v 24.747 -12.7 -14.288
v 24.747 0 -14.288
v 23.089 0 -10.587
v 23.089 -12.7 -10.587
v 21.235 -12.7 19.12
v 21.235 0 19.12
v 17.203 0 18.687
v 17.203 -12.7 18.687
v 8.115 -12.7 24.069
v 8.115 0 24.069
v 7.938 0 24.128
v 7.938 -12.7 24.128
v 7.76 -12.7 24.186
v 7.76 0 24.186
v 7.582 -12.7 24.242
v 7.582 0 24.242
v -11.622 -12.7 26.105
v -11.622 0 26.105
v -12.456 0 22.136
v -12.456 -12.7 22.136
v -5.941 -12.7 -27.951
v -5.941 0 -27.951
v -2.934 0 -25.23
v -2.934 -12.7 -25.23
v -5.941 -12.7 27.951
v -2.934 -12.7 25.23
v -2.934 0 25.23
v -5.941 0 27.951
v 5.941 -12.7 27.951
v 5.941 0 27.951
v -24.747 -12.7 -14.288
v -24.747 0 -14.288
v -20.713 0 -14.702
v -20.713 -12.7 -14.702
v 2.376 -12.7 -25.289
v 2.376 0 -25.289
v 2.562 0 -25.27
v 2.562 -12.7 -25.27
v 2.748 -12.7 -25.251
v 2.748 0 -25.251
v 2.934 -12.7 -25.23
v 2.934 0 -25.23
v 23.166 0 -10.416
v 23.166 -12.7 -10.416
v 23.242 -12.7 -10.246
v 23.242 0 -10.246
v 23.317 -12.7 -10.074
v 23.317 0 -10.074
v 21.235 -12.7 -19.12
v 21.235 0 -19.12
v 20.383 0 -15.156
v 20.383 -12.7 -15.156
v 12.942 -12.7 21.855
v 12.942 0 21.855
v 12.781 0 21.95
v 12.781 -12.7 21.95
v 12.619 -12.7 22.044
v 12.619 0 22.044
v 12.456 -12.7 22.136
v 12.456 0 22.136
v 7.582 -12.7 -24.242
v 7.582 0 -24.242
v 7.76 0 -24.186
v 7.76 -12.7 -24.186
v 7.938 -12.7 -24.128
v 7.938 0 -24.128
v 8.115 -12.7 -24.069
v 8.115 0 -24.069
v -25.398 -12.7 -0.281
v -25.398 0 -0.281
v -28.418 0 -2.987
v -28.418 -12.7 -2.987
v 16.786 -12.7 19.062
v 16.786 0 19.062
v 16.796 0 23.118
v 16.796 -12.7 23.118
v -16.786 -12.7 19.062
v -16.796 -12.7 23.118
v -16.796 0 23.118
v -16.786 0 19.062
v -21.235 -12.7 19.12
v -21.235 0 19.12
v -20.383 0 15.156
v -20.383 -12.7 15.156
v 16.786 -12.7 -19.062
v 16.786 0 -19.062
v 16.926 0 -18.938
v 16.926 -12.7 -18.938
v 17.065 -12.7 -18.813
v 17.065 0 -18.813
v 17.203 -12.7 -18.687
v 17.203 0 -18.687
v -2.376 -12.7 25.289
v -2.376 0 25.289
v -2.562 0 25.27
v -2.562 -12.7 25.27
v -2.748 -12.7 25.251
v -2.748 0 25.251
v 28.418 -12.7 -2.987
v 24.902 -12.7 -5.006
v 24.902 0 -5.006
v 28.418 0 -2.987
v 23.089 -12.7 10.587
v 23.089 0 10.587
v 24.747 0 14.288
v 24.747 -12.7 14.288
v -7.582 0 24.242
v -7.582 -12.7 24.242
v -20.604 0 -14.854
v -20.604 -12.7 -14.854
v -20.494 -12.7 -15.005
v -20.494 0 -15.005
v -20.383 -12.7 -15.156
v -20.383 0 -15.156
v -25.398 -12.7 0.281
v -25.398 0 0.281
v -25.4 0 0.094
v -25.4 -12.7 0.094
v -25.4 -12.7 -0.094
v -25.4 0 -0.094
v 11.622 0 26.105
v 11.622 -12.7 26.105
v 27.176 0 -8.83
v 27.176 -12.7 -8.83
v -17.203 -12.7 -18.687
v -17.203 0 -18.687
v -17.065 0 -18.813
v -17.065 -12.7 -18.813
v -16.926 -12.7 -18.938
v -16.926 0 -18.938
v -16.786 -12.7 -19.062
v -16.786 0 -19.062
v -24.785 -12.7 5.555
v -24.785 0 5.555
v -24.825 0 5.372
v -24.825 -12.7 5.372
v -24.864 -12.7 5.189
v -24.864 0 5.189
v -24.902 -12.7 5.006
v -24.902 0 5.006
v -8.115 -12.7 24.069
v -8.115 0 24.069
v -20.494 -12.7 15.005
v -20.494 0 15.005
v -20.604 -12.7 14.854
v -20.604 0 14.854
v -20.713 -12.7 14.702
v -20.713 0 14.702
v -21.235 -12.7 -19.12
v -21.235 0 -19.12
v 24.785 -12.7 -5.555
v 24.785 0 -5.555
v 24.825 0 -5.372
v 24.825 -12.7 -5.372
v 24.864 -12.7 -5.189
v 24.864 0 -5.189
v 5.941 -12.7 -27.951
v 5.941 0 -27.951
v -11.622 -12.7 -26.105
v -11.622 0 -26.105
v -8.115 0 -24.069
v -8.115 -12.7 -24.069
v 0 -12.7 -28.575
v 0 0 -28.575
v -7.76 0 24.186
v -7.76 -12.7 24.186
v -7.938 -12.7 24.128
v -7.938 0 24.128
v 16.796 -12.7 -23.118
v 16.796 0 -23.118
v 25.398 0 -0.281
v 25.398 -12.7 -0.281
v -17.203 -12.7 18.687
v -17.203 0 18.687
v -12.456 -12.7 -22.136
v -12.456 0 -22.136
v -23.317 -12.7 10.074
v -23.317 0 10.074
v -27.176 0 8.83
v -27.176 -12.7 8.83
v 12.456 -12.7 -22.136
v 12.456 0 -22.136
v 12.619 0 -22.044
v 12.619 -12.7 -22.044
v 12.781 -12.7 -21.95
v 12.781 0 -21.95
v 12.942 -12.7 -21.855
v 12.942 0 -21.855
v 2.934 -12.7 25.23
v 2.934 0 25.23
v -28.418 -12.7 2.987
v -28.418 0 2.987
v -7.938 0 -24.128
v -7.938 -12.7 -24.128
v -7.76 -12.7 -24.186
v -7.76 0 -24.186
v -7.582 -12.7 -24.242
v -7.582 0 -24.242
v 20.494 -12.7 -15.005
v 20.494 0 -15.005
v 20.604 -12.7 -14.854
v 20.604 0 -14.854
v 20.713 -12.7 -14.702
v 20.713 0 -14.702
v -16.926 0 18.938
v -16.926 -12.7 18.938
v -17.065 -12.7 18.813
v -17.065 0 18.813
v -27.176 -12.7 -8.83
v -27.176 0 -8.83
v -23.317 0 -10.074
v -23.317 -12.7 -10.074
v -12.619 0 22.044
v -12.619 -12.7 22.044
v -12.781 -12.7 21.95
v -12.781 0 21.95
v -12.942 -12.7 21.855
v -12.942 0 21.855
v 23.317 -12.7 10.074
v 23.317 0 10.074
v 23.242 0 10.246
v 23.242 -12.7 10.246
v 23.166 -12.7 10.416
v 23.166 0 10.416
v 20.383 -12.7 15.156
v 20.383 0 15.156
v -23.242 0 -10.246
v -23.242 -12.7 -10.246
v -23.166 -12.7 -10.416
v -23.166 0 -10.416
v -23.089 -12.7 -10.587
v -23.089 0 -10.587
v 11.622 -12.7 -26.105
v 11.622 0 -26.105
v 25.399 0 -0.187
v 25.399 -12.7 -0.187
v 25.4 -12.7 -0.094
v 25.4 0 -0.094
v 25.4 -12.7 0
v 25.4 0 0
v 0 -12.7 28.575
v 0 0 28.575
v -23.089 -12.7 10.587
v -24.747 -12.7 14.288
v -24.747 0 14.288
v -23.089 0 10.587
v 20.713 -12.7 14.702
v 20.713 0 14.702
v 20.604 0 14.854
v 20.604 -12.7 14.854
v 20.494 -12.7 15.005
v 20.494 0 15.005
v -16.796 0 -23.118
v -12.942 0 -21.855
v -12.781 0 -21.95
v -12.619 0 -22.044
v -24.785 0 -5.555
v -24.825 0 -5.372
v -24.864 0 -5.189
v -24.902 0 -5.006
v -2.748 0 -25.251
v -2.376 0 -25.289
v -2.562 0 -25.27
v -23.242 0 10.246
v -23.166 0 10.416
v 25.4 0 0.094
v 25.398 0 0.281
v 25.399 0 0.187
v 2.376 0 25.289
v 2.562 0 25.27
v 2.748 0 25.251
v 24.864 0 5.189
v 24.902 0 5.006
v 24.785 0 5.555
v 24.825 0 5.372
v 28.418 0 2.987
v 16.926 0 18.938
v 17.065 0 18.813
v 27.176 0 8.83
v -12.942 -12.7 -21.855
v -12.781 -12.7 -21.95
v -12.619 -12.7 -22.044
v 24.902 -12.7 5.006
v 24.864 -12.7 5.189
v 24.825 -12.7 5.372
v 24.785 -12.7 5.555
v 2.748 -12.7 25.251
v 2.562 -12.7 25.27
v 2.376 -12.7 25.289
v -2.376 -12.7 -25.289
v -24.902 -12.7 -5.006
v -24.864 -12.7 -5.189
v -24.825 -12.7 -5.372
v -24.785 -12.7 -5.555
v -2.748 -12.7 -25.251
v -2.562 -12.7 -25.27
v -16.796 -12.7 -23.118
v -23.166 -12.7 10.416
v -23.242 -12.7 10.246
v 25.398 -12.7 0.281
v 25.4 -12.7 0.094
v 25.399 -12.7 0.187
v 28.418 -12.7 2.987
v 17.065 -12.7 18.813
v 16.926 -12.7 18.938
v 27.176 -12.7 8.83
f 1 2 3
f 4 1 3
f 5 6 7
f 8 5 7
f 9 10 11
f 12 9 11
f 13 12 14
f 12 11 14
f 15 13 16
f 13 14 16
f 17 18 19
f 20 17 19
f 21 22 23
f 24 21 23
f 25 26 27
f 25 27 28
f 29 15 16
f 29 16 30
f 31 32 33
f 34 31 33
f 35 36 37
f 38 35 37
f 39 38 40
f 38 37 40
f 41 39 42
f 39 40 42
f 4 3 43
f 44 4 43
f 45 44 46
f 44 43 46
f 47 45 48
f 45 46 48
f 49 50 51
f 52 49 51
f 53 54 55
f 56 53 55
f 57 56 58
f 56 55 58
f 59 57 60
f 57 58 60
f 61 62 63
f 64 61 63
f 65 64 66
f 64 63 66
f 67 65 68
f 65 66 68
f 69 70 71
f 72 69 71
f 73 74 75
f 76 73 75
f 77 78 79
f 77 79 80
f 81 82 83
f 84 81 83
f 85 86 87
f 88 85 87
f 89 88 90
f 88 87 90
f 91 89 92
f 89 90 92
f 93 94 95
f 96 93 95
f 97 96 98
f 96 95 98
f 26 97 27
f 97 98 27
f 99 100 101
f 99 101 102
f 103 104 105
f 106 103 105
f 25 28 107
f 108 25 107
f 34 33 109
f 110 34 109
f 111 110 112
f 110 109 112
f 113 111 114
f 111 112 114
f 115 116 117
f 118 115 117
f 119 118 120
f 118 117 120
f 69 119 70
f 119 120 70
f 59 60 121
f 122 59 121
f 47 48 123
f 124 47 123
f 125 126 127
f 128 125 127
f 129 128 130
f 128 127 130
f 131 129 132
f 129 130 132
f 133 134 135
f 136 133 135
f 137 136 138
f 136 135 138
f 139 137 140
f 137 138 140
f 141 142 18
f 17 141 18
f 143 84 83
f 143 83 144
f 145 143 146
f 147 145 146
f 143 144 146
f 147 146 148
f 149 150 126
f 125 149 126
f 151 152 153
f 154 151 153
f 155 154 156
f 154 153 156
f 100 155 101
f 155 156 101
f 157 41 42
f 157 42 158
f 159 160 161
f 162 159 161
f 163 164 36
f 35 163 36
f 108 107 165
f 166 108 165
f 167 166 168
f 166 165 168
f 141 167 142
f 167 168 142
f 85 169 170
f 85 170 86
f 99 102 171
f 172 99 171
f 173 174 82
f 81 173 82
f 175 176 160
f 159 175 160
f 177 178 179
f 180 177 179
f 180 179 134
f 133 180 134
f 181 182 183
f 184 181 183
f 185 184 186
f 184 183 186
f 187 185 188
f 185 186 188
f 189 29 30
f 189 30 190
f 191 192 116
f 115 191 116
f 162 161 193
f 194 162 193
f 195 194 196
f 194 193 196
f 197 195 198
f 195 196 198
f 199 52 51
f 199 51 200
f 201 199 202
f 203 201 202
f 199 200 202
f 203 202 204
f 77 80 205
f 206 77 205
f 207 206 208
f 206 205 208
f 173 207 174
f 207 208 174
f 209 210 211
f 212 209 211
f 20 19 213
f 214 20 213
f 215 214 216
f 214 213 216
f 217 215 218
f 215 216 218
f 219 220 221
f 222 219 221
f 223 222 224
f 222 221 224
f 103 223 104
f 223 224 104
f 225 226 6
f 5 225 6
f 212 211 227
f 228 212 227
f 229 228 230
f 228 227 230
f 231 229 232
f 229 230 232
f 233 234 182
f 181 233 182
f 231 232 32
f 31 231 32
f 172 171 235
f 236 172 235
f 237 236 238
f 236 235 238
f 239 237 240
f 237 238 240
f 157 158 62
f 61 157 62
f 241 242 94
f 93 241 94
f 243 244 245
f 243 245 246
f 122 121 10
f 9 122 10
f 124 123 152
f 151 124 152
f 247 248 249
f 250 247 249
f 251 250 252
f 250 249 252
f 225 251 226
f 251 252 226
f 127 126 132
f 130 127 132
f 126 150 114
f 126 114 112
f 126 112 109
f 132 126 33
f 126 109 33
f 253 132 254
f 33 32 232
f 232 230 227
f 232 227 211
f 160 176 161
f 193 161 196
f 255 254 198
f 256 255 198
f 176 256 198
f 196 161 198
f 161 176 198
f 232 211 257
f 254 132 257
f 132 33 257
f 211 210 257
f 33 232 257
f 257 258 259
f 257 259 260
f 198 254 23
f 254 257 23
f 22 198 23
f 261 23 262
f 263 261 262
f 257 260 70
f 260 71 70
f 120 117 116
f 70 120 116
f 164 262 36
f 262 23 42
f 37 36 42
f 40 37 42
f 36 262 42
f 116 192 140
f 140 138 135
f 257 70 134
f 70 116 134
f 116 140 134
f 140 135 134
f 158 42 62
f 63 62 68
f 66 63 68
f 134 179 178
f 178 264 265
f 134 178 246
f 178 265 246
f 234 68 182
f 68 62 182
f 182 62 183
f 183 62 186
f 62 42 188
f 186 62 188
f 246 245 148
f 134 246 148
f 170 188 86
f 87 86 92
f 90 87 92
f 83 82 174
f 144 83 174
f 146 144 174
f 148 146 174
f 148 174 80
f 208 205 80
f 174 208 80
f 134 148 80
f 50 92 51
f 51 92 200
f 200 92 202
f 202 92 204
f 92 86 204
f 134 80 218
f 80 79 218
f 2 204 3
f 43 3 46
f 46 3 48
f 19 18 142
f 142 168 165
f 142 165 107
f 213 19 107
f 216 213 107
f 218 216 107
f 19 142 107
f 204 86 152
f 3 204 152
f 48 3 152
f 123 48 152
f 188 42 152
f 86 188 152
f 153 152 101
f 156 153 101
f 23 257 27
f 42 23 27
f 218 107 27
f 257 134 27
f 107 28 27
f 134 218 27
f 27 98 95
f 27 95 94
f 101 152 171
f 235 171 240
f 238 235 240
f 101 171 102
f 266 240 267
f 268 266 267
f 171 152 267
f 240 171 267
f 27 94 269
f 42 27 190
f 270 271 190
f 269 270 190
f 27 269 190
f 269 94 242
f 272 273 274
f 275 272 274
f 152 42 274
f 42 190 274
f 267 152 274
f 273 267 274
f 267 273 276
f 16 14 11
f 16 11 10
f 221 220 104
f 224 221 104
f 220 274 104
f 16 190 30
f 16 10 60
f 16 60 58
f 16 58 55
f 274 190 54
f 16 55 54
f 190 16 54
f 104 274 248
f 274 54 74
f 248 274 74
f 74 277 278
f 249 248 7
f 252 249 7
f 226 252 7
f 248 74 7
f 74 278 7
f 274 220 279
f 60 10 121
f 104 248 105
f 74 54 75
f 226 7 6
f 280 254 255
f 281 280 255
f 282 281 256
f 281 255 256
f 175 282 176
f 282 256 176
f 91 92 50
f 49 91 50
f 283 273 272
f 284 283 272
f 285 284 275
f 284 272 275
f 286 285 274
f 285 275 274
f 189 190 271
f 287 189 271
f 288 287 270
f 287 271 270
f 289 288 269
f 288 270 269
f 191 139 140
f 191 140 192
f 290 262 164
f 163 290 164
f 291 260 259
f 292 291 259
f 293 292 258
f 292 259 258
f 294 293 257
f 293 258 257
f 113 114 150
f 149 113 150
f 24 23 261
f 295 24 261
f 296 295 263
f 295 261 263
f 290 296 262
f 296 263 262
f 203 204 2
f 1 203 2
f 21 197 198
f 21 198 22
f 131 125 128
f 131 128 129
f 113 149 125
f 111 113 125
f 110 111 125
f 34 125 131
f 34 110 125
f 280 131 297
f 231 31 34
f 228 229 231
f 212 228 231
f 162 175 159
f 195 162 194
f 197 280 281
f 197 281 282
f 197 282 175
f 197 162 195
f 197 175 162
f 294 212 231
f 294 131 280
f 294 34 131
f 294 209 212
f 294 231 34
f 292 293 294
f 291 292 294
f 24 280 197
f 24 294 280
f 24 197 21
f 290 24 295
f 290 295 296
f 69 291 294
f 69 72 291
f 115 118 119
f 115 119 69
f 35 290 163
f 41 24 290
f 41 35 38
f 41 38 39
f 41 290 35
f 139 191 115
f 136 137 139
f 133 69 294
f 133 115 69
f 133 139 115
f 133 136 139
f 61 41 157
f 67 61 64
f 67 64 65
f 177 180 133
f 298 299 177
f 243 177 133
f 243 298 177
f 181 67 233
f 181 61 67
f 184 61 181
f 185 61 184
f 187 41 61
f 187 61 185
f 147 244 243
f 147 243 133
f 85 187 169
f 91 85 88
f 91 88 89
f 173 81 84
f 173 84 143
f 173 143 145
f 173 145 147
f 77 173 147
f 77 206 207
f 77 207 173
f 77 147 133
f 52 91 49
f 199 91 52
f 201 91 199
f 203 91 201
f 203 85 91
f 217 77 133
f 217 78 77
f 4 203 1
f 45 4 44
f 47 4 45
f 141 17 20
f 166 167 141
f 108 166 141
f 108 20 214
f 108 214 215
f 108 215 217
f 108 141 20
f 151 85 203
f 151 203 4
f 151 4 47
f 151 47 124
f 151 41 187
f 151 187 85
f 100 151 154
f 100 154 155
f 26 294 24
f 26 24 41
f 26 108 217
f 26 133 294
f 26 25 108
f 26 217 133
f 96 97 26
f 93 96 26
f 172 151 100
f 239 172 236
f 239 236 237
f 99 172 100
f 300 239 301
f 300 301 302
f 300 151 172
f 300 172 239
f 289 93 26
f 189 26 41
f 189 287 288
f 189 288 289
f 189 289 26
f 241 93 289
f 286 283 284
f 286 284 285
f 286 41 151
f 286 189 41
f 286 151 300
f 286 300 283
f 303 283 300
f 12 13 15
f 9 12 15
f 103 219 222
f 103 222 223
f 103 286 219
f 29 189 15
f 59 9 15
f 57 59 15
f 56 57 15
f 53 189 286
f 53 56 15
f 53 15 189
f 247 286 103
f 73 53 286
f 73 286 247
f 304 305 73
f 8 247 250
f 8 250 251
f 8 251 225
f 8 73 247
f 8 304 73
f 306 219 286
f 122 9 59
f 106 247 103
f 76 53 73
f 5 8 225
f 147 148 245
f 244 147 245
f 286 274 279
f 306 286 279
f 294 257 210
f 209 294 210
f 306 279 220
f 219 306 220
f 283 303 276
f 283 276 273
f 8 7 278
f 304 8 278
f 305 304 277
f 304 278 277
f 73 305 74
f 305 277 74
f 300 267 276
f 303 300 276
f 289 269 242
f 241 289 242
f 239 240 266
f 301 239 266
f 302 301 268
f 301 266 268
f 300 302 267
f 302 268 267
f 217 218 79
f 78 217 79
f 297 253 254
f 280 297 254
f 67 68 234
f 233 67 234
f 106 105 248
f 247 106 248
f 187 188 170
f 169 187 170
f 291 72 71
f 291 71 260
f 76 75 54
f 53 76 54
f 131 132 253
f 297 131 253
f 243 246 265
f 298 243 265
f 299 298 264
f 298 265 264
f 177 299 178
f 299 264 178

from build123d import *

# Parameters (mm, degrees)
F1_DEPTH = 12.7


with BuildPart() as f1:
    # F0 (on Front) → F1 (new body)
    with BuildSketch(Plane.XZ):
        with BuildLine():
            ThreePointArc((25.39845, -0.280579), (25.399613, -0.140292), (25.4, 0))
            ThreePointArc((25.4, 0), (25.399613, 0.140292), (25.39845, 0.280579))
            ThreePointArc((25.39845, 0.280579), (25.260856, 2.655023), (24.901769, 5.006187))
            ThreePointArc((24.901769, 5.006187), (24.844949, 5.280957), (24.785097, 5.555083))
            ThreePointArc((24.785097, 5.555083), (24.156836, 7.849032), (23.316761, 10.074158))
            ThreePointArc((23.316761, 10.074158), (23.204055, 10.331111), (23.088517, 10.586802))
            ThreePointArc((23.088517, 10.586802), (21.997045, 12.7), (20.712698, 14.701841))
            ThreePointArc((20.712698, 14.701841), (20.549032, 14.929745), (20.382858, 15.155828))
            ThreePointArc((20.382858, 15.155828), (18.875879, 16.995917), (17.203391, 18.686983))
            ThreePointArc((17.203391, 18.686983), (16.995917, 18.875879), (16.786369, 19.062471))
            ThreePointArc((16.786369, 19.062471), (14.929745, 20.549032), (12.942214, 21.855413))
            ThreePointArc((12.942214, 21.855413), (12.7, 21.997045), (12.456236, 22.135993))
            ThreePointArc((12.456236, 22.135993), (10.331111, 23.204055), (8.1154, 24.068658))
            ThreePointArc((8.1154, 24.068658), (7.849032, 24.156836), (7.581706, 24.242065))
            ThreePointArc((7.581706, 24.242065), (5.280957, 24.844949), (2.933903, 25.229986))
            ThreePointArc((2.933903, 25.229986), (2.655023, 25.260856), (2.375819, 25.288643))
            ThreePointArc((2.375819, 25.288643), (0, 25.4), (-2.375819, 25.288643))
            ThreePointArc((-2.375819, 25.288643), (-2.655023, 25.260856), (-2.933903, 25.229986))
            ThreePointArc((-2.933903, 25.229986), (-5.280957, 24.844949), (-7.581706, 24.242065))
            ThreePointArc((-7.581706, 24.242065), (-7.849032, 24.156836), (-8.1154, 24.068658))
            ThreePointArc((-8.1154, 24.068658), (-10.331111, 23.204055), (-12.456236, 22.135993))
            ThreePointArc((-12.456236, 22.135993), (-12.7, 21.997045), (-12.942214, 21.855413))
            ThreePointArc((-12.942214, 21.855413), (-14.929745, 20.549032), (-16.786369, 19.062471))
            ThreePointArc((-16.786369, 19.062471), (-16.995917, 18.875879), (-17.203391, 18.686983))
            ThreePointArc((-17.203391, 18.686983), (-18.875879, 16.995917), (-20.382858, 15.155828))
            ThreePointArc((-20.382858, 15.155828), (-20.549032, 14.929745), (-20.712698, 14.701841))
            ThreePointArc((-20.712698, 14.701841), (-21.997045, 12.7), (-23.088517, 10.586802))
            ThreePointArc((-23.088517, 10.586802), (-23.204055, 10.331111), (-23.316761, 10.074158))
            ThreePointArc((-23.316761, 10.074158), (-24.156836, 7.849032), (-24.785097, 5.555083))
            ThreePointArc((-24.785097, 5.555083), (-24.844949, 5.280957), (-24.901769, 5.006187))
            ThreePointArc((-24.901769, 5.006187), (-25.260856, 2.655023), (-25.39845, 0.280579))
            ThreePointArc((-25.39845, 0.280579), (-25.4, 0), (-25.39845, -0.280579))
            ThreePointArc((-25.39845, -0.280579), (-25.260856, -2.655023), (-24.901769, -5.006187))
            ThreePointArc((-24.901769, -5.006187), (-24.844949, -5.280957), (-24.785097, -5.555083))
            ThreePointArc((-24.785097, -5.555083), (-24.156836, -7.849032), (-23.316761, -10.074158))
            ThreePointArc((-23.316761, -10.074158), (-23.204055, -10.331111), (-23.088517, -10.586802))
            ThreePointArc((-23.088517, -10.586802), (-21.997045, -12.7), (-20.712698, -14.701841))
            ThreePointArc((-20.712698, -14.701841), (-20.549032, -14.929745), (-20.382858, -15.155828))
            ThreePointArc((-20.382858, -15.155828), (-18.875879, -16.995917), (-17.203391, -18.686983))
            ThreePointArc((-17.203391, -18.686983), (-16.995917, -18.875879), (-16.786369, -19.062471))
            ThreePointArc((-16.786369, -19.062471), (-14.929745, -20.549032), (-12.942214, -21.855413))
            ThreePointArc((-12.942214, -21.855413), (-12.7, -21.997045), (-12.456236, -22.135993))
            ThreePointArc((-12.456236, -22.135993), (-10.331111, -23.204055), (-8.1154, -24.068658))
            ThreePointArc((-8.1154, -24.068658), (-7.849032, -24.156836), (-7.581706, -24.242065))
            ThreePointArc((-7.581706, -24.242065), (-5.280957, -24.844949), (-2.933903, -25.229986))
            ThreePointArc((-2.933903, -25.229986), (-2.655023, -25.260856), (-2.375819, -25.288643))
            ThreePointArc((-2.375819, -25.288643), (0, -25.4), (2.375819, -25.288643))
            ThreePointArc((2.375819, -25.288643), (2.655023, -25.260856), (2.933903, -25.229986))
            ThreePointArc((2.933903, -25.229986), (5.280957, -24.844949), (7.581706, -24.242065))
            ThreePointArc((7.581706, -24.242065), (7.849032, -24.156836), (8.1154, -24.068658))
            ThreePointArc((8.1154, -24.068658), (10.331111, -23.204055), (12.456236, -22.135993))
            ThreePointArc((12.456236, -22.135993), (12.7, -21.997045), (12.942214, -21.855413))
            ThreePointArc((12.942214, -21.855413), (14.929745, -20.549032), (16.786369, -19.062471))
            ThreePointArc((16.786369, -19.062471), (16.995917, -18.875879), (17.203391, -18.686983))
            ThreePointArc((17.203391, -18.686983), (18.875879, -16.995917), (20.382858, -15.155828))
            ThreePointArc((20.382858, -15.155828), (20.549032, -14.929745), (20.712698, -14.701841))
            ThreePointArc((20.712698, -14.701841), (21.997045, -12.7), (23.088517, -10.586802))
            ThreePointArc((23.088517, -10.586802), (23.204055, -10.331111), (23.316761, -10.074158))
            ThreePointArc((23.316761, -10.074158), (24.156836, -7.849032), (24.785097, -5.555083))
            ThreePointArc((24.785097, -5.555083), (24.844949, -5.280957), (24.901769, -5.006187))
            ThreePointArc((24.901769, -5.006187), (25.260856, -2.655023), (25.39845, -0.280579))
        make_face()
        with BuildLine():
            ThreePointArc((24.901769, 5.006187), (25.260856, 2.655023), (25.39845, 0.280579))
            Line((25.39845, 0.280579), (28.418463, 2.986901))
            Line((28.418463, 2.986901), (24.901769, 5.006187))
        make_face()
        with BuildLine():
            Line((28.418463, -2.986901), (25.39845, -0.280579))
            ThreePointArc((25.39845, -0.280579), (25.260856, -2.655023), (24.901769, -5.006187))
            Line((24.901769, -5.006187), (28.418463, -2.986901))
        make_face()
        with BuildLine():
            ThreePointArc((23.316761, 10.074158), (24.156836, 7.849032), (24.785097, 5.555083))
            Line((24.785097, 5.555083), (27.17644, 8.830161))
            Line((27.17644, 8.830161), (23.316761, 10.074158))
        make_face()
        with BuildLine():
            Line((27.17644, -8.830161), (24.785097, -5.555083))
            ThreePointArc((24.785097, -5.555083), (24.156836, -7.849032), (23.316761, -10.074158))
            Line((23.316761, -10.074158), (27.17644, -8.830161))
        make_face()
        with BuildLine():
            ThreePointArc((20.712698, 14.701841), (21.997045, 12.7), (23.088517, 10.586802))
            Line((23.088517, 10.586802), (24.746676, 14.2875))
            Line((24.746676, 14.2875), (20.712698, 14.701841))
        make_face()
        with BuildLine():
            Line((24.746676, -14.2875), (23.088517, -10.586802))
            ThreePointArc((23.088517, -10.586802), (21.997045, -12.7), (20.712698, -14.701841))
            Line((20.712698, -14.701841), (24.746676, -14.2875))
        make_face()
        with BuildLine():
            ThreePointArc((17.203391, 18.686983), (18.875879, 16.995917), (20.382858, 15.155828))
            Line((20.382858, 15.155828), (21.235363, 19.120407))
            Line((21.235363, 19.120407), (17.203391, 18.686983))
        make_face()
        with BuildLine():
            Line((21.235363, -19.120407), (20.382858, -15.155828))
            ThreePointArc((20.382858, -15.155828), (18.875879, -16.995917), (17.203391, -18.686983))
            Line((17.203391, -18.686983), (21.235363, -19.120407))
        make_face()
        with BuildLine():
            ThreePointArc((12.942214, 21.855413), (14.929745, 20.549032), (16.786369, 19.062471))
            Line((16.786369, 19.062471), (16.795964, 23.117661))
            Line((16.795964, 23.117661), (12.942214, 21.855413))
        make_face()
        with BuildLine():
            Line((16.795964, -23.117661), (16.786369, -19.062471))
            ThreePointArc((16.786369, -19.062471), (14.929745, -20.549032), (12.942214, -21.855413))
            Line((12.942214, -21.855413), (16.795964, -23.117661))
        make_face()
        with BuildLine():
            ThreePointArc((8.1154, 24.068658), (10.331111, 23.204055), (12.456236, 22.135993))
            Line((12.456236, 22.135993), (11.6225, 26.104561))
            Line((11.6225, 26.104561), (8.1154, 24.068658))
        make_face()
        with BuildLine():
            Line((11.6225, -26.104561), (12.456236, -22.135993))
            ThreePointArc((12.456236, -22.135993), (10.331111, -23.204055), (8.1154, -24.068658))
            Line((8.1154, -24.068658), (11.6225, -26.104561))
        make_face()
        with BuildLine():
            ThreePointArc((2.933903, 25.229986), (5.280957, 24.844949), (7.581706, 24.242065))
            Line((7.581706, 24.242065), (5.941077, 27.950568))
            Line((5.941077, 27.950568), (2.933903, 25.229986))
        make_face()
        with BuildLine():
            Line((5.941077, -27.950568), (7.581706, -24.242065))
            ThreePointArc((7.581706, -24.242065), (5.280957, -24.844949), (2.933903, -25.229986))
            Line((2.933903, -25.229986), (5.941077, -27.950568))
        make_face()
        with BuildLine():
            ThreePointArc((-2.375819, 25.288643), (0, 25.4), (2.375819, 25.288643))
            Line((2.375819, 25.288643), (0, 28.575))
            Line((0, 28.575), (-2.375819, 25.288643))
        make_face()
        with BuildLine():
            Line((0, -28.575), (2.375819, -25.288643))
            ThreePointArc((2.375819, -25.288643), (0, -25.4), (-2.375819, -25.288643))
            Line((-2.375819, -25.288643), (0, -28.575))
        make_face()
        with BuildLine():
            ThreePointArc((-7.581706, 24.242065), (-5.280957, 24.844949), (-2.933903, 25.229986))
            Line((-2.933903, 25.229986), (-5.941077, 27.950568))
            Line((-5.941077, 27.950568), (-7.581706, 24.242065))
        make_face()
        with BuildLine():
            Line((-5.941077, -27.950568), (-2.933903, -25.229986))
            ThreePointArc((-2.933903, -25.229986), (-5.280957, -24.844949), (-7.581706, -24.242065))
            Line((-7.581706, -24.242065), (-5.941077, -27.950568))
        make_face()
        with BuildLine():
            ThreePointArc((-12.456236, 22.135993), (-10.331111, 23.204055), (-8.1154, 24.068658))
            Line((-8.1154, 24.068658), (-11.6225, 26.104561))
            Line((-11.6225, 26.104561), (-12.456236, 22.135993))
        make_face()
        with BuildLine():
            Line((-11.6225, -26.104561), (-8.1154, -24.068658))
            ThreePointArc((-8.1154, -24.068658), (-10.331111, -23.204055), (-12.456236, -22.135993))
            Line((-12.456236, -22.135993), (-11.6225, -26.104561))
        make_face()
        with BuildLine():
            ThreePointArc((-16.786369, 19.062471), (-14.929745, 20.549032), (-12.942214, 21.855413))
            Line((-12.942214, 21.855413), (-16.795964, 23.117661))
            Line((-16.795964, 23.117661), (-16.786369, 19.062471))
        make_face()
        with BuildLine():
            Line((-16.795964, -23.117661), (-12.942214, -21.855413))
            ThreePointArc((-12.942214, -21.855413), (-14.929745, -20.549032), (-16.786369, -19.062471))
            Line((-16.786369, -19.062471), (-16.795964, -23.117661))
        make_face()
        with BuildLine():
            ThreePointArc((-20.382858, 15.155828), (-18.875879, 16.995917), (-17.203391, 18.686983))
            Line((-17.203391, 18.686983), (-21.235363, 19.120407))
            Line((-21.235363, 19.120407), (-20.382858, 15.155828))
        make_face()
        with BuildLine():
            Line((-21.235363, -19.120407), (-17.203391, -18.686983))
            ThreePointArc((-17.203391, -18.686983), (-18.875879, -16.995917), (-20.382858, -15.155828))
            Line((-20.382858, -15.155828), (-21.235363, -19.120407))
        make_face()
        with BuildLine():
            ThreePointArc((-23.088517, 10.586802), (-21.997045, 12.7), (-20.712698, 14.701841))
            Line((-20.712698, 14.701841), (-24.746676, 14.2875))
            Line((-24.746676, 14.2875), (-23.088517, 10.586802))
        make_face()
        with BuildLine():
            Line((-24.746676, -14.2875), (-20.712698, -14.701841))
            ThreePointArc((-20.712698, -14.701841), (-21.997045, -12.7), (-23.088517, -10.586802))
            Line((-23.088517, -10.586802), (-24.746676, -14.2875))
        make_face()
        with BuildLine():
            ThreePointArc((-24.785097, 5.555083), (-24.156836, 7.849032), (-23.316761, 10.074158))
            Line((-23.316761, 10.074158), (-27.17644, 8.830161))
            Line((-27.17644, 8.830161), (-24.785097, 5.555083))
        make_face()
        with BuildLine():
            Line((-27.17644, -8.830161), (-23.316761, -10.074158))
            ThreePointArc((-23.316761, -10.074158), (-24.156836, -7.849032), (-24.785097, -5.555083))
            Line((-24.785097, -5.555083), (-27.17644, -8.830161))
        make_face()
        with BuildLine():
            ThreePointArc((-25.39845, 0.280579), (-25.260856, 2.655023), (-24.901769, 5.006187))
            Line((-24.901769, 5.006187), (-28.418463, 2.986901))
            Line((-28.418463, 2.986901), (-25.39845, 0.280579))
        make_face()
        with BuildLine():
            Line((-28.418463, -2.986901), (-24.901769, -5.006187))
            ThreePointArc((-24.901769, -5.006187), (-25.260856, -2.655023), (-25.39845, -0.280579))
            Line((-25.39845, -0.280579), (-28.418463, -2.986901))
        make_face()
    extrude(amount=F1_DEPTH)


solid = f1.part
